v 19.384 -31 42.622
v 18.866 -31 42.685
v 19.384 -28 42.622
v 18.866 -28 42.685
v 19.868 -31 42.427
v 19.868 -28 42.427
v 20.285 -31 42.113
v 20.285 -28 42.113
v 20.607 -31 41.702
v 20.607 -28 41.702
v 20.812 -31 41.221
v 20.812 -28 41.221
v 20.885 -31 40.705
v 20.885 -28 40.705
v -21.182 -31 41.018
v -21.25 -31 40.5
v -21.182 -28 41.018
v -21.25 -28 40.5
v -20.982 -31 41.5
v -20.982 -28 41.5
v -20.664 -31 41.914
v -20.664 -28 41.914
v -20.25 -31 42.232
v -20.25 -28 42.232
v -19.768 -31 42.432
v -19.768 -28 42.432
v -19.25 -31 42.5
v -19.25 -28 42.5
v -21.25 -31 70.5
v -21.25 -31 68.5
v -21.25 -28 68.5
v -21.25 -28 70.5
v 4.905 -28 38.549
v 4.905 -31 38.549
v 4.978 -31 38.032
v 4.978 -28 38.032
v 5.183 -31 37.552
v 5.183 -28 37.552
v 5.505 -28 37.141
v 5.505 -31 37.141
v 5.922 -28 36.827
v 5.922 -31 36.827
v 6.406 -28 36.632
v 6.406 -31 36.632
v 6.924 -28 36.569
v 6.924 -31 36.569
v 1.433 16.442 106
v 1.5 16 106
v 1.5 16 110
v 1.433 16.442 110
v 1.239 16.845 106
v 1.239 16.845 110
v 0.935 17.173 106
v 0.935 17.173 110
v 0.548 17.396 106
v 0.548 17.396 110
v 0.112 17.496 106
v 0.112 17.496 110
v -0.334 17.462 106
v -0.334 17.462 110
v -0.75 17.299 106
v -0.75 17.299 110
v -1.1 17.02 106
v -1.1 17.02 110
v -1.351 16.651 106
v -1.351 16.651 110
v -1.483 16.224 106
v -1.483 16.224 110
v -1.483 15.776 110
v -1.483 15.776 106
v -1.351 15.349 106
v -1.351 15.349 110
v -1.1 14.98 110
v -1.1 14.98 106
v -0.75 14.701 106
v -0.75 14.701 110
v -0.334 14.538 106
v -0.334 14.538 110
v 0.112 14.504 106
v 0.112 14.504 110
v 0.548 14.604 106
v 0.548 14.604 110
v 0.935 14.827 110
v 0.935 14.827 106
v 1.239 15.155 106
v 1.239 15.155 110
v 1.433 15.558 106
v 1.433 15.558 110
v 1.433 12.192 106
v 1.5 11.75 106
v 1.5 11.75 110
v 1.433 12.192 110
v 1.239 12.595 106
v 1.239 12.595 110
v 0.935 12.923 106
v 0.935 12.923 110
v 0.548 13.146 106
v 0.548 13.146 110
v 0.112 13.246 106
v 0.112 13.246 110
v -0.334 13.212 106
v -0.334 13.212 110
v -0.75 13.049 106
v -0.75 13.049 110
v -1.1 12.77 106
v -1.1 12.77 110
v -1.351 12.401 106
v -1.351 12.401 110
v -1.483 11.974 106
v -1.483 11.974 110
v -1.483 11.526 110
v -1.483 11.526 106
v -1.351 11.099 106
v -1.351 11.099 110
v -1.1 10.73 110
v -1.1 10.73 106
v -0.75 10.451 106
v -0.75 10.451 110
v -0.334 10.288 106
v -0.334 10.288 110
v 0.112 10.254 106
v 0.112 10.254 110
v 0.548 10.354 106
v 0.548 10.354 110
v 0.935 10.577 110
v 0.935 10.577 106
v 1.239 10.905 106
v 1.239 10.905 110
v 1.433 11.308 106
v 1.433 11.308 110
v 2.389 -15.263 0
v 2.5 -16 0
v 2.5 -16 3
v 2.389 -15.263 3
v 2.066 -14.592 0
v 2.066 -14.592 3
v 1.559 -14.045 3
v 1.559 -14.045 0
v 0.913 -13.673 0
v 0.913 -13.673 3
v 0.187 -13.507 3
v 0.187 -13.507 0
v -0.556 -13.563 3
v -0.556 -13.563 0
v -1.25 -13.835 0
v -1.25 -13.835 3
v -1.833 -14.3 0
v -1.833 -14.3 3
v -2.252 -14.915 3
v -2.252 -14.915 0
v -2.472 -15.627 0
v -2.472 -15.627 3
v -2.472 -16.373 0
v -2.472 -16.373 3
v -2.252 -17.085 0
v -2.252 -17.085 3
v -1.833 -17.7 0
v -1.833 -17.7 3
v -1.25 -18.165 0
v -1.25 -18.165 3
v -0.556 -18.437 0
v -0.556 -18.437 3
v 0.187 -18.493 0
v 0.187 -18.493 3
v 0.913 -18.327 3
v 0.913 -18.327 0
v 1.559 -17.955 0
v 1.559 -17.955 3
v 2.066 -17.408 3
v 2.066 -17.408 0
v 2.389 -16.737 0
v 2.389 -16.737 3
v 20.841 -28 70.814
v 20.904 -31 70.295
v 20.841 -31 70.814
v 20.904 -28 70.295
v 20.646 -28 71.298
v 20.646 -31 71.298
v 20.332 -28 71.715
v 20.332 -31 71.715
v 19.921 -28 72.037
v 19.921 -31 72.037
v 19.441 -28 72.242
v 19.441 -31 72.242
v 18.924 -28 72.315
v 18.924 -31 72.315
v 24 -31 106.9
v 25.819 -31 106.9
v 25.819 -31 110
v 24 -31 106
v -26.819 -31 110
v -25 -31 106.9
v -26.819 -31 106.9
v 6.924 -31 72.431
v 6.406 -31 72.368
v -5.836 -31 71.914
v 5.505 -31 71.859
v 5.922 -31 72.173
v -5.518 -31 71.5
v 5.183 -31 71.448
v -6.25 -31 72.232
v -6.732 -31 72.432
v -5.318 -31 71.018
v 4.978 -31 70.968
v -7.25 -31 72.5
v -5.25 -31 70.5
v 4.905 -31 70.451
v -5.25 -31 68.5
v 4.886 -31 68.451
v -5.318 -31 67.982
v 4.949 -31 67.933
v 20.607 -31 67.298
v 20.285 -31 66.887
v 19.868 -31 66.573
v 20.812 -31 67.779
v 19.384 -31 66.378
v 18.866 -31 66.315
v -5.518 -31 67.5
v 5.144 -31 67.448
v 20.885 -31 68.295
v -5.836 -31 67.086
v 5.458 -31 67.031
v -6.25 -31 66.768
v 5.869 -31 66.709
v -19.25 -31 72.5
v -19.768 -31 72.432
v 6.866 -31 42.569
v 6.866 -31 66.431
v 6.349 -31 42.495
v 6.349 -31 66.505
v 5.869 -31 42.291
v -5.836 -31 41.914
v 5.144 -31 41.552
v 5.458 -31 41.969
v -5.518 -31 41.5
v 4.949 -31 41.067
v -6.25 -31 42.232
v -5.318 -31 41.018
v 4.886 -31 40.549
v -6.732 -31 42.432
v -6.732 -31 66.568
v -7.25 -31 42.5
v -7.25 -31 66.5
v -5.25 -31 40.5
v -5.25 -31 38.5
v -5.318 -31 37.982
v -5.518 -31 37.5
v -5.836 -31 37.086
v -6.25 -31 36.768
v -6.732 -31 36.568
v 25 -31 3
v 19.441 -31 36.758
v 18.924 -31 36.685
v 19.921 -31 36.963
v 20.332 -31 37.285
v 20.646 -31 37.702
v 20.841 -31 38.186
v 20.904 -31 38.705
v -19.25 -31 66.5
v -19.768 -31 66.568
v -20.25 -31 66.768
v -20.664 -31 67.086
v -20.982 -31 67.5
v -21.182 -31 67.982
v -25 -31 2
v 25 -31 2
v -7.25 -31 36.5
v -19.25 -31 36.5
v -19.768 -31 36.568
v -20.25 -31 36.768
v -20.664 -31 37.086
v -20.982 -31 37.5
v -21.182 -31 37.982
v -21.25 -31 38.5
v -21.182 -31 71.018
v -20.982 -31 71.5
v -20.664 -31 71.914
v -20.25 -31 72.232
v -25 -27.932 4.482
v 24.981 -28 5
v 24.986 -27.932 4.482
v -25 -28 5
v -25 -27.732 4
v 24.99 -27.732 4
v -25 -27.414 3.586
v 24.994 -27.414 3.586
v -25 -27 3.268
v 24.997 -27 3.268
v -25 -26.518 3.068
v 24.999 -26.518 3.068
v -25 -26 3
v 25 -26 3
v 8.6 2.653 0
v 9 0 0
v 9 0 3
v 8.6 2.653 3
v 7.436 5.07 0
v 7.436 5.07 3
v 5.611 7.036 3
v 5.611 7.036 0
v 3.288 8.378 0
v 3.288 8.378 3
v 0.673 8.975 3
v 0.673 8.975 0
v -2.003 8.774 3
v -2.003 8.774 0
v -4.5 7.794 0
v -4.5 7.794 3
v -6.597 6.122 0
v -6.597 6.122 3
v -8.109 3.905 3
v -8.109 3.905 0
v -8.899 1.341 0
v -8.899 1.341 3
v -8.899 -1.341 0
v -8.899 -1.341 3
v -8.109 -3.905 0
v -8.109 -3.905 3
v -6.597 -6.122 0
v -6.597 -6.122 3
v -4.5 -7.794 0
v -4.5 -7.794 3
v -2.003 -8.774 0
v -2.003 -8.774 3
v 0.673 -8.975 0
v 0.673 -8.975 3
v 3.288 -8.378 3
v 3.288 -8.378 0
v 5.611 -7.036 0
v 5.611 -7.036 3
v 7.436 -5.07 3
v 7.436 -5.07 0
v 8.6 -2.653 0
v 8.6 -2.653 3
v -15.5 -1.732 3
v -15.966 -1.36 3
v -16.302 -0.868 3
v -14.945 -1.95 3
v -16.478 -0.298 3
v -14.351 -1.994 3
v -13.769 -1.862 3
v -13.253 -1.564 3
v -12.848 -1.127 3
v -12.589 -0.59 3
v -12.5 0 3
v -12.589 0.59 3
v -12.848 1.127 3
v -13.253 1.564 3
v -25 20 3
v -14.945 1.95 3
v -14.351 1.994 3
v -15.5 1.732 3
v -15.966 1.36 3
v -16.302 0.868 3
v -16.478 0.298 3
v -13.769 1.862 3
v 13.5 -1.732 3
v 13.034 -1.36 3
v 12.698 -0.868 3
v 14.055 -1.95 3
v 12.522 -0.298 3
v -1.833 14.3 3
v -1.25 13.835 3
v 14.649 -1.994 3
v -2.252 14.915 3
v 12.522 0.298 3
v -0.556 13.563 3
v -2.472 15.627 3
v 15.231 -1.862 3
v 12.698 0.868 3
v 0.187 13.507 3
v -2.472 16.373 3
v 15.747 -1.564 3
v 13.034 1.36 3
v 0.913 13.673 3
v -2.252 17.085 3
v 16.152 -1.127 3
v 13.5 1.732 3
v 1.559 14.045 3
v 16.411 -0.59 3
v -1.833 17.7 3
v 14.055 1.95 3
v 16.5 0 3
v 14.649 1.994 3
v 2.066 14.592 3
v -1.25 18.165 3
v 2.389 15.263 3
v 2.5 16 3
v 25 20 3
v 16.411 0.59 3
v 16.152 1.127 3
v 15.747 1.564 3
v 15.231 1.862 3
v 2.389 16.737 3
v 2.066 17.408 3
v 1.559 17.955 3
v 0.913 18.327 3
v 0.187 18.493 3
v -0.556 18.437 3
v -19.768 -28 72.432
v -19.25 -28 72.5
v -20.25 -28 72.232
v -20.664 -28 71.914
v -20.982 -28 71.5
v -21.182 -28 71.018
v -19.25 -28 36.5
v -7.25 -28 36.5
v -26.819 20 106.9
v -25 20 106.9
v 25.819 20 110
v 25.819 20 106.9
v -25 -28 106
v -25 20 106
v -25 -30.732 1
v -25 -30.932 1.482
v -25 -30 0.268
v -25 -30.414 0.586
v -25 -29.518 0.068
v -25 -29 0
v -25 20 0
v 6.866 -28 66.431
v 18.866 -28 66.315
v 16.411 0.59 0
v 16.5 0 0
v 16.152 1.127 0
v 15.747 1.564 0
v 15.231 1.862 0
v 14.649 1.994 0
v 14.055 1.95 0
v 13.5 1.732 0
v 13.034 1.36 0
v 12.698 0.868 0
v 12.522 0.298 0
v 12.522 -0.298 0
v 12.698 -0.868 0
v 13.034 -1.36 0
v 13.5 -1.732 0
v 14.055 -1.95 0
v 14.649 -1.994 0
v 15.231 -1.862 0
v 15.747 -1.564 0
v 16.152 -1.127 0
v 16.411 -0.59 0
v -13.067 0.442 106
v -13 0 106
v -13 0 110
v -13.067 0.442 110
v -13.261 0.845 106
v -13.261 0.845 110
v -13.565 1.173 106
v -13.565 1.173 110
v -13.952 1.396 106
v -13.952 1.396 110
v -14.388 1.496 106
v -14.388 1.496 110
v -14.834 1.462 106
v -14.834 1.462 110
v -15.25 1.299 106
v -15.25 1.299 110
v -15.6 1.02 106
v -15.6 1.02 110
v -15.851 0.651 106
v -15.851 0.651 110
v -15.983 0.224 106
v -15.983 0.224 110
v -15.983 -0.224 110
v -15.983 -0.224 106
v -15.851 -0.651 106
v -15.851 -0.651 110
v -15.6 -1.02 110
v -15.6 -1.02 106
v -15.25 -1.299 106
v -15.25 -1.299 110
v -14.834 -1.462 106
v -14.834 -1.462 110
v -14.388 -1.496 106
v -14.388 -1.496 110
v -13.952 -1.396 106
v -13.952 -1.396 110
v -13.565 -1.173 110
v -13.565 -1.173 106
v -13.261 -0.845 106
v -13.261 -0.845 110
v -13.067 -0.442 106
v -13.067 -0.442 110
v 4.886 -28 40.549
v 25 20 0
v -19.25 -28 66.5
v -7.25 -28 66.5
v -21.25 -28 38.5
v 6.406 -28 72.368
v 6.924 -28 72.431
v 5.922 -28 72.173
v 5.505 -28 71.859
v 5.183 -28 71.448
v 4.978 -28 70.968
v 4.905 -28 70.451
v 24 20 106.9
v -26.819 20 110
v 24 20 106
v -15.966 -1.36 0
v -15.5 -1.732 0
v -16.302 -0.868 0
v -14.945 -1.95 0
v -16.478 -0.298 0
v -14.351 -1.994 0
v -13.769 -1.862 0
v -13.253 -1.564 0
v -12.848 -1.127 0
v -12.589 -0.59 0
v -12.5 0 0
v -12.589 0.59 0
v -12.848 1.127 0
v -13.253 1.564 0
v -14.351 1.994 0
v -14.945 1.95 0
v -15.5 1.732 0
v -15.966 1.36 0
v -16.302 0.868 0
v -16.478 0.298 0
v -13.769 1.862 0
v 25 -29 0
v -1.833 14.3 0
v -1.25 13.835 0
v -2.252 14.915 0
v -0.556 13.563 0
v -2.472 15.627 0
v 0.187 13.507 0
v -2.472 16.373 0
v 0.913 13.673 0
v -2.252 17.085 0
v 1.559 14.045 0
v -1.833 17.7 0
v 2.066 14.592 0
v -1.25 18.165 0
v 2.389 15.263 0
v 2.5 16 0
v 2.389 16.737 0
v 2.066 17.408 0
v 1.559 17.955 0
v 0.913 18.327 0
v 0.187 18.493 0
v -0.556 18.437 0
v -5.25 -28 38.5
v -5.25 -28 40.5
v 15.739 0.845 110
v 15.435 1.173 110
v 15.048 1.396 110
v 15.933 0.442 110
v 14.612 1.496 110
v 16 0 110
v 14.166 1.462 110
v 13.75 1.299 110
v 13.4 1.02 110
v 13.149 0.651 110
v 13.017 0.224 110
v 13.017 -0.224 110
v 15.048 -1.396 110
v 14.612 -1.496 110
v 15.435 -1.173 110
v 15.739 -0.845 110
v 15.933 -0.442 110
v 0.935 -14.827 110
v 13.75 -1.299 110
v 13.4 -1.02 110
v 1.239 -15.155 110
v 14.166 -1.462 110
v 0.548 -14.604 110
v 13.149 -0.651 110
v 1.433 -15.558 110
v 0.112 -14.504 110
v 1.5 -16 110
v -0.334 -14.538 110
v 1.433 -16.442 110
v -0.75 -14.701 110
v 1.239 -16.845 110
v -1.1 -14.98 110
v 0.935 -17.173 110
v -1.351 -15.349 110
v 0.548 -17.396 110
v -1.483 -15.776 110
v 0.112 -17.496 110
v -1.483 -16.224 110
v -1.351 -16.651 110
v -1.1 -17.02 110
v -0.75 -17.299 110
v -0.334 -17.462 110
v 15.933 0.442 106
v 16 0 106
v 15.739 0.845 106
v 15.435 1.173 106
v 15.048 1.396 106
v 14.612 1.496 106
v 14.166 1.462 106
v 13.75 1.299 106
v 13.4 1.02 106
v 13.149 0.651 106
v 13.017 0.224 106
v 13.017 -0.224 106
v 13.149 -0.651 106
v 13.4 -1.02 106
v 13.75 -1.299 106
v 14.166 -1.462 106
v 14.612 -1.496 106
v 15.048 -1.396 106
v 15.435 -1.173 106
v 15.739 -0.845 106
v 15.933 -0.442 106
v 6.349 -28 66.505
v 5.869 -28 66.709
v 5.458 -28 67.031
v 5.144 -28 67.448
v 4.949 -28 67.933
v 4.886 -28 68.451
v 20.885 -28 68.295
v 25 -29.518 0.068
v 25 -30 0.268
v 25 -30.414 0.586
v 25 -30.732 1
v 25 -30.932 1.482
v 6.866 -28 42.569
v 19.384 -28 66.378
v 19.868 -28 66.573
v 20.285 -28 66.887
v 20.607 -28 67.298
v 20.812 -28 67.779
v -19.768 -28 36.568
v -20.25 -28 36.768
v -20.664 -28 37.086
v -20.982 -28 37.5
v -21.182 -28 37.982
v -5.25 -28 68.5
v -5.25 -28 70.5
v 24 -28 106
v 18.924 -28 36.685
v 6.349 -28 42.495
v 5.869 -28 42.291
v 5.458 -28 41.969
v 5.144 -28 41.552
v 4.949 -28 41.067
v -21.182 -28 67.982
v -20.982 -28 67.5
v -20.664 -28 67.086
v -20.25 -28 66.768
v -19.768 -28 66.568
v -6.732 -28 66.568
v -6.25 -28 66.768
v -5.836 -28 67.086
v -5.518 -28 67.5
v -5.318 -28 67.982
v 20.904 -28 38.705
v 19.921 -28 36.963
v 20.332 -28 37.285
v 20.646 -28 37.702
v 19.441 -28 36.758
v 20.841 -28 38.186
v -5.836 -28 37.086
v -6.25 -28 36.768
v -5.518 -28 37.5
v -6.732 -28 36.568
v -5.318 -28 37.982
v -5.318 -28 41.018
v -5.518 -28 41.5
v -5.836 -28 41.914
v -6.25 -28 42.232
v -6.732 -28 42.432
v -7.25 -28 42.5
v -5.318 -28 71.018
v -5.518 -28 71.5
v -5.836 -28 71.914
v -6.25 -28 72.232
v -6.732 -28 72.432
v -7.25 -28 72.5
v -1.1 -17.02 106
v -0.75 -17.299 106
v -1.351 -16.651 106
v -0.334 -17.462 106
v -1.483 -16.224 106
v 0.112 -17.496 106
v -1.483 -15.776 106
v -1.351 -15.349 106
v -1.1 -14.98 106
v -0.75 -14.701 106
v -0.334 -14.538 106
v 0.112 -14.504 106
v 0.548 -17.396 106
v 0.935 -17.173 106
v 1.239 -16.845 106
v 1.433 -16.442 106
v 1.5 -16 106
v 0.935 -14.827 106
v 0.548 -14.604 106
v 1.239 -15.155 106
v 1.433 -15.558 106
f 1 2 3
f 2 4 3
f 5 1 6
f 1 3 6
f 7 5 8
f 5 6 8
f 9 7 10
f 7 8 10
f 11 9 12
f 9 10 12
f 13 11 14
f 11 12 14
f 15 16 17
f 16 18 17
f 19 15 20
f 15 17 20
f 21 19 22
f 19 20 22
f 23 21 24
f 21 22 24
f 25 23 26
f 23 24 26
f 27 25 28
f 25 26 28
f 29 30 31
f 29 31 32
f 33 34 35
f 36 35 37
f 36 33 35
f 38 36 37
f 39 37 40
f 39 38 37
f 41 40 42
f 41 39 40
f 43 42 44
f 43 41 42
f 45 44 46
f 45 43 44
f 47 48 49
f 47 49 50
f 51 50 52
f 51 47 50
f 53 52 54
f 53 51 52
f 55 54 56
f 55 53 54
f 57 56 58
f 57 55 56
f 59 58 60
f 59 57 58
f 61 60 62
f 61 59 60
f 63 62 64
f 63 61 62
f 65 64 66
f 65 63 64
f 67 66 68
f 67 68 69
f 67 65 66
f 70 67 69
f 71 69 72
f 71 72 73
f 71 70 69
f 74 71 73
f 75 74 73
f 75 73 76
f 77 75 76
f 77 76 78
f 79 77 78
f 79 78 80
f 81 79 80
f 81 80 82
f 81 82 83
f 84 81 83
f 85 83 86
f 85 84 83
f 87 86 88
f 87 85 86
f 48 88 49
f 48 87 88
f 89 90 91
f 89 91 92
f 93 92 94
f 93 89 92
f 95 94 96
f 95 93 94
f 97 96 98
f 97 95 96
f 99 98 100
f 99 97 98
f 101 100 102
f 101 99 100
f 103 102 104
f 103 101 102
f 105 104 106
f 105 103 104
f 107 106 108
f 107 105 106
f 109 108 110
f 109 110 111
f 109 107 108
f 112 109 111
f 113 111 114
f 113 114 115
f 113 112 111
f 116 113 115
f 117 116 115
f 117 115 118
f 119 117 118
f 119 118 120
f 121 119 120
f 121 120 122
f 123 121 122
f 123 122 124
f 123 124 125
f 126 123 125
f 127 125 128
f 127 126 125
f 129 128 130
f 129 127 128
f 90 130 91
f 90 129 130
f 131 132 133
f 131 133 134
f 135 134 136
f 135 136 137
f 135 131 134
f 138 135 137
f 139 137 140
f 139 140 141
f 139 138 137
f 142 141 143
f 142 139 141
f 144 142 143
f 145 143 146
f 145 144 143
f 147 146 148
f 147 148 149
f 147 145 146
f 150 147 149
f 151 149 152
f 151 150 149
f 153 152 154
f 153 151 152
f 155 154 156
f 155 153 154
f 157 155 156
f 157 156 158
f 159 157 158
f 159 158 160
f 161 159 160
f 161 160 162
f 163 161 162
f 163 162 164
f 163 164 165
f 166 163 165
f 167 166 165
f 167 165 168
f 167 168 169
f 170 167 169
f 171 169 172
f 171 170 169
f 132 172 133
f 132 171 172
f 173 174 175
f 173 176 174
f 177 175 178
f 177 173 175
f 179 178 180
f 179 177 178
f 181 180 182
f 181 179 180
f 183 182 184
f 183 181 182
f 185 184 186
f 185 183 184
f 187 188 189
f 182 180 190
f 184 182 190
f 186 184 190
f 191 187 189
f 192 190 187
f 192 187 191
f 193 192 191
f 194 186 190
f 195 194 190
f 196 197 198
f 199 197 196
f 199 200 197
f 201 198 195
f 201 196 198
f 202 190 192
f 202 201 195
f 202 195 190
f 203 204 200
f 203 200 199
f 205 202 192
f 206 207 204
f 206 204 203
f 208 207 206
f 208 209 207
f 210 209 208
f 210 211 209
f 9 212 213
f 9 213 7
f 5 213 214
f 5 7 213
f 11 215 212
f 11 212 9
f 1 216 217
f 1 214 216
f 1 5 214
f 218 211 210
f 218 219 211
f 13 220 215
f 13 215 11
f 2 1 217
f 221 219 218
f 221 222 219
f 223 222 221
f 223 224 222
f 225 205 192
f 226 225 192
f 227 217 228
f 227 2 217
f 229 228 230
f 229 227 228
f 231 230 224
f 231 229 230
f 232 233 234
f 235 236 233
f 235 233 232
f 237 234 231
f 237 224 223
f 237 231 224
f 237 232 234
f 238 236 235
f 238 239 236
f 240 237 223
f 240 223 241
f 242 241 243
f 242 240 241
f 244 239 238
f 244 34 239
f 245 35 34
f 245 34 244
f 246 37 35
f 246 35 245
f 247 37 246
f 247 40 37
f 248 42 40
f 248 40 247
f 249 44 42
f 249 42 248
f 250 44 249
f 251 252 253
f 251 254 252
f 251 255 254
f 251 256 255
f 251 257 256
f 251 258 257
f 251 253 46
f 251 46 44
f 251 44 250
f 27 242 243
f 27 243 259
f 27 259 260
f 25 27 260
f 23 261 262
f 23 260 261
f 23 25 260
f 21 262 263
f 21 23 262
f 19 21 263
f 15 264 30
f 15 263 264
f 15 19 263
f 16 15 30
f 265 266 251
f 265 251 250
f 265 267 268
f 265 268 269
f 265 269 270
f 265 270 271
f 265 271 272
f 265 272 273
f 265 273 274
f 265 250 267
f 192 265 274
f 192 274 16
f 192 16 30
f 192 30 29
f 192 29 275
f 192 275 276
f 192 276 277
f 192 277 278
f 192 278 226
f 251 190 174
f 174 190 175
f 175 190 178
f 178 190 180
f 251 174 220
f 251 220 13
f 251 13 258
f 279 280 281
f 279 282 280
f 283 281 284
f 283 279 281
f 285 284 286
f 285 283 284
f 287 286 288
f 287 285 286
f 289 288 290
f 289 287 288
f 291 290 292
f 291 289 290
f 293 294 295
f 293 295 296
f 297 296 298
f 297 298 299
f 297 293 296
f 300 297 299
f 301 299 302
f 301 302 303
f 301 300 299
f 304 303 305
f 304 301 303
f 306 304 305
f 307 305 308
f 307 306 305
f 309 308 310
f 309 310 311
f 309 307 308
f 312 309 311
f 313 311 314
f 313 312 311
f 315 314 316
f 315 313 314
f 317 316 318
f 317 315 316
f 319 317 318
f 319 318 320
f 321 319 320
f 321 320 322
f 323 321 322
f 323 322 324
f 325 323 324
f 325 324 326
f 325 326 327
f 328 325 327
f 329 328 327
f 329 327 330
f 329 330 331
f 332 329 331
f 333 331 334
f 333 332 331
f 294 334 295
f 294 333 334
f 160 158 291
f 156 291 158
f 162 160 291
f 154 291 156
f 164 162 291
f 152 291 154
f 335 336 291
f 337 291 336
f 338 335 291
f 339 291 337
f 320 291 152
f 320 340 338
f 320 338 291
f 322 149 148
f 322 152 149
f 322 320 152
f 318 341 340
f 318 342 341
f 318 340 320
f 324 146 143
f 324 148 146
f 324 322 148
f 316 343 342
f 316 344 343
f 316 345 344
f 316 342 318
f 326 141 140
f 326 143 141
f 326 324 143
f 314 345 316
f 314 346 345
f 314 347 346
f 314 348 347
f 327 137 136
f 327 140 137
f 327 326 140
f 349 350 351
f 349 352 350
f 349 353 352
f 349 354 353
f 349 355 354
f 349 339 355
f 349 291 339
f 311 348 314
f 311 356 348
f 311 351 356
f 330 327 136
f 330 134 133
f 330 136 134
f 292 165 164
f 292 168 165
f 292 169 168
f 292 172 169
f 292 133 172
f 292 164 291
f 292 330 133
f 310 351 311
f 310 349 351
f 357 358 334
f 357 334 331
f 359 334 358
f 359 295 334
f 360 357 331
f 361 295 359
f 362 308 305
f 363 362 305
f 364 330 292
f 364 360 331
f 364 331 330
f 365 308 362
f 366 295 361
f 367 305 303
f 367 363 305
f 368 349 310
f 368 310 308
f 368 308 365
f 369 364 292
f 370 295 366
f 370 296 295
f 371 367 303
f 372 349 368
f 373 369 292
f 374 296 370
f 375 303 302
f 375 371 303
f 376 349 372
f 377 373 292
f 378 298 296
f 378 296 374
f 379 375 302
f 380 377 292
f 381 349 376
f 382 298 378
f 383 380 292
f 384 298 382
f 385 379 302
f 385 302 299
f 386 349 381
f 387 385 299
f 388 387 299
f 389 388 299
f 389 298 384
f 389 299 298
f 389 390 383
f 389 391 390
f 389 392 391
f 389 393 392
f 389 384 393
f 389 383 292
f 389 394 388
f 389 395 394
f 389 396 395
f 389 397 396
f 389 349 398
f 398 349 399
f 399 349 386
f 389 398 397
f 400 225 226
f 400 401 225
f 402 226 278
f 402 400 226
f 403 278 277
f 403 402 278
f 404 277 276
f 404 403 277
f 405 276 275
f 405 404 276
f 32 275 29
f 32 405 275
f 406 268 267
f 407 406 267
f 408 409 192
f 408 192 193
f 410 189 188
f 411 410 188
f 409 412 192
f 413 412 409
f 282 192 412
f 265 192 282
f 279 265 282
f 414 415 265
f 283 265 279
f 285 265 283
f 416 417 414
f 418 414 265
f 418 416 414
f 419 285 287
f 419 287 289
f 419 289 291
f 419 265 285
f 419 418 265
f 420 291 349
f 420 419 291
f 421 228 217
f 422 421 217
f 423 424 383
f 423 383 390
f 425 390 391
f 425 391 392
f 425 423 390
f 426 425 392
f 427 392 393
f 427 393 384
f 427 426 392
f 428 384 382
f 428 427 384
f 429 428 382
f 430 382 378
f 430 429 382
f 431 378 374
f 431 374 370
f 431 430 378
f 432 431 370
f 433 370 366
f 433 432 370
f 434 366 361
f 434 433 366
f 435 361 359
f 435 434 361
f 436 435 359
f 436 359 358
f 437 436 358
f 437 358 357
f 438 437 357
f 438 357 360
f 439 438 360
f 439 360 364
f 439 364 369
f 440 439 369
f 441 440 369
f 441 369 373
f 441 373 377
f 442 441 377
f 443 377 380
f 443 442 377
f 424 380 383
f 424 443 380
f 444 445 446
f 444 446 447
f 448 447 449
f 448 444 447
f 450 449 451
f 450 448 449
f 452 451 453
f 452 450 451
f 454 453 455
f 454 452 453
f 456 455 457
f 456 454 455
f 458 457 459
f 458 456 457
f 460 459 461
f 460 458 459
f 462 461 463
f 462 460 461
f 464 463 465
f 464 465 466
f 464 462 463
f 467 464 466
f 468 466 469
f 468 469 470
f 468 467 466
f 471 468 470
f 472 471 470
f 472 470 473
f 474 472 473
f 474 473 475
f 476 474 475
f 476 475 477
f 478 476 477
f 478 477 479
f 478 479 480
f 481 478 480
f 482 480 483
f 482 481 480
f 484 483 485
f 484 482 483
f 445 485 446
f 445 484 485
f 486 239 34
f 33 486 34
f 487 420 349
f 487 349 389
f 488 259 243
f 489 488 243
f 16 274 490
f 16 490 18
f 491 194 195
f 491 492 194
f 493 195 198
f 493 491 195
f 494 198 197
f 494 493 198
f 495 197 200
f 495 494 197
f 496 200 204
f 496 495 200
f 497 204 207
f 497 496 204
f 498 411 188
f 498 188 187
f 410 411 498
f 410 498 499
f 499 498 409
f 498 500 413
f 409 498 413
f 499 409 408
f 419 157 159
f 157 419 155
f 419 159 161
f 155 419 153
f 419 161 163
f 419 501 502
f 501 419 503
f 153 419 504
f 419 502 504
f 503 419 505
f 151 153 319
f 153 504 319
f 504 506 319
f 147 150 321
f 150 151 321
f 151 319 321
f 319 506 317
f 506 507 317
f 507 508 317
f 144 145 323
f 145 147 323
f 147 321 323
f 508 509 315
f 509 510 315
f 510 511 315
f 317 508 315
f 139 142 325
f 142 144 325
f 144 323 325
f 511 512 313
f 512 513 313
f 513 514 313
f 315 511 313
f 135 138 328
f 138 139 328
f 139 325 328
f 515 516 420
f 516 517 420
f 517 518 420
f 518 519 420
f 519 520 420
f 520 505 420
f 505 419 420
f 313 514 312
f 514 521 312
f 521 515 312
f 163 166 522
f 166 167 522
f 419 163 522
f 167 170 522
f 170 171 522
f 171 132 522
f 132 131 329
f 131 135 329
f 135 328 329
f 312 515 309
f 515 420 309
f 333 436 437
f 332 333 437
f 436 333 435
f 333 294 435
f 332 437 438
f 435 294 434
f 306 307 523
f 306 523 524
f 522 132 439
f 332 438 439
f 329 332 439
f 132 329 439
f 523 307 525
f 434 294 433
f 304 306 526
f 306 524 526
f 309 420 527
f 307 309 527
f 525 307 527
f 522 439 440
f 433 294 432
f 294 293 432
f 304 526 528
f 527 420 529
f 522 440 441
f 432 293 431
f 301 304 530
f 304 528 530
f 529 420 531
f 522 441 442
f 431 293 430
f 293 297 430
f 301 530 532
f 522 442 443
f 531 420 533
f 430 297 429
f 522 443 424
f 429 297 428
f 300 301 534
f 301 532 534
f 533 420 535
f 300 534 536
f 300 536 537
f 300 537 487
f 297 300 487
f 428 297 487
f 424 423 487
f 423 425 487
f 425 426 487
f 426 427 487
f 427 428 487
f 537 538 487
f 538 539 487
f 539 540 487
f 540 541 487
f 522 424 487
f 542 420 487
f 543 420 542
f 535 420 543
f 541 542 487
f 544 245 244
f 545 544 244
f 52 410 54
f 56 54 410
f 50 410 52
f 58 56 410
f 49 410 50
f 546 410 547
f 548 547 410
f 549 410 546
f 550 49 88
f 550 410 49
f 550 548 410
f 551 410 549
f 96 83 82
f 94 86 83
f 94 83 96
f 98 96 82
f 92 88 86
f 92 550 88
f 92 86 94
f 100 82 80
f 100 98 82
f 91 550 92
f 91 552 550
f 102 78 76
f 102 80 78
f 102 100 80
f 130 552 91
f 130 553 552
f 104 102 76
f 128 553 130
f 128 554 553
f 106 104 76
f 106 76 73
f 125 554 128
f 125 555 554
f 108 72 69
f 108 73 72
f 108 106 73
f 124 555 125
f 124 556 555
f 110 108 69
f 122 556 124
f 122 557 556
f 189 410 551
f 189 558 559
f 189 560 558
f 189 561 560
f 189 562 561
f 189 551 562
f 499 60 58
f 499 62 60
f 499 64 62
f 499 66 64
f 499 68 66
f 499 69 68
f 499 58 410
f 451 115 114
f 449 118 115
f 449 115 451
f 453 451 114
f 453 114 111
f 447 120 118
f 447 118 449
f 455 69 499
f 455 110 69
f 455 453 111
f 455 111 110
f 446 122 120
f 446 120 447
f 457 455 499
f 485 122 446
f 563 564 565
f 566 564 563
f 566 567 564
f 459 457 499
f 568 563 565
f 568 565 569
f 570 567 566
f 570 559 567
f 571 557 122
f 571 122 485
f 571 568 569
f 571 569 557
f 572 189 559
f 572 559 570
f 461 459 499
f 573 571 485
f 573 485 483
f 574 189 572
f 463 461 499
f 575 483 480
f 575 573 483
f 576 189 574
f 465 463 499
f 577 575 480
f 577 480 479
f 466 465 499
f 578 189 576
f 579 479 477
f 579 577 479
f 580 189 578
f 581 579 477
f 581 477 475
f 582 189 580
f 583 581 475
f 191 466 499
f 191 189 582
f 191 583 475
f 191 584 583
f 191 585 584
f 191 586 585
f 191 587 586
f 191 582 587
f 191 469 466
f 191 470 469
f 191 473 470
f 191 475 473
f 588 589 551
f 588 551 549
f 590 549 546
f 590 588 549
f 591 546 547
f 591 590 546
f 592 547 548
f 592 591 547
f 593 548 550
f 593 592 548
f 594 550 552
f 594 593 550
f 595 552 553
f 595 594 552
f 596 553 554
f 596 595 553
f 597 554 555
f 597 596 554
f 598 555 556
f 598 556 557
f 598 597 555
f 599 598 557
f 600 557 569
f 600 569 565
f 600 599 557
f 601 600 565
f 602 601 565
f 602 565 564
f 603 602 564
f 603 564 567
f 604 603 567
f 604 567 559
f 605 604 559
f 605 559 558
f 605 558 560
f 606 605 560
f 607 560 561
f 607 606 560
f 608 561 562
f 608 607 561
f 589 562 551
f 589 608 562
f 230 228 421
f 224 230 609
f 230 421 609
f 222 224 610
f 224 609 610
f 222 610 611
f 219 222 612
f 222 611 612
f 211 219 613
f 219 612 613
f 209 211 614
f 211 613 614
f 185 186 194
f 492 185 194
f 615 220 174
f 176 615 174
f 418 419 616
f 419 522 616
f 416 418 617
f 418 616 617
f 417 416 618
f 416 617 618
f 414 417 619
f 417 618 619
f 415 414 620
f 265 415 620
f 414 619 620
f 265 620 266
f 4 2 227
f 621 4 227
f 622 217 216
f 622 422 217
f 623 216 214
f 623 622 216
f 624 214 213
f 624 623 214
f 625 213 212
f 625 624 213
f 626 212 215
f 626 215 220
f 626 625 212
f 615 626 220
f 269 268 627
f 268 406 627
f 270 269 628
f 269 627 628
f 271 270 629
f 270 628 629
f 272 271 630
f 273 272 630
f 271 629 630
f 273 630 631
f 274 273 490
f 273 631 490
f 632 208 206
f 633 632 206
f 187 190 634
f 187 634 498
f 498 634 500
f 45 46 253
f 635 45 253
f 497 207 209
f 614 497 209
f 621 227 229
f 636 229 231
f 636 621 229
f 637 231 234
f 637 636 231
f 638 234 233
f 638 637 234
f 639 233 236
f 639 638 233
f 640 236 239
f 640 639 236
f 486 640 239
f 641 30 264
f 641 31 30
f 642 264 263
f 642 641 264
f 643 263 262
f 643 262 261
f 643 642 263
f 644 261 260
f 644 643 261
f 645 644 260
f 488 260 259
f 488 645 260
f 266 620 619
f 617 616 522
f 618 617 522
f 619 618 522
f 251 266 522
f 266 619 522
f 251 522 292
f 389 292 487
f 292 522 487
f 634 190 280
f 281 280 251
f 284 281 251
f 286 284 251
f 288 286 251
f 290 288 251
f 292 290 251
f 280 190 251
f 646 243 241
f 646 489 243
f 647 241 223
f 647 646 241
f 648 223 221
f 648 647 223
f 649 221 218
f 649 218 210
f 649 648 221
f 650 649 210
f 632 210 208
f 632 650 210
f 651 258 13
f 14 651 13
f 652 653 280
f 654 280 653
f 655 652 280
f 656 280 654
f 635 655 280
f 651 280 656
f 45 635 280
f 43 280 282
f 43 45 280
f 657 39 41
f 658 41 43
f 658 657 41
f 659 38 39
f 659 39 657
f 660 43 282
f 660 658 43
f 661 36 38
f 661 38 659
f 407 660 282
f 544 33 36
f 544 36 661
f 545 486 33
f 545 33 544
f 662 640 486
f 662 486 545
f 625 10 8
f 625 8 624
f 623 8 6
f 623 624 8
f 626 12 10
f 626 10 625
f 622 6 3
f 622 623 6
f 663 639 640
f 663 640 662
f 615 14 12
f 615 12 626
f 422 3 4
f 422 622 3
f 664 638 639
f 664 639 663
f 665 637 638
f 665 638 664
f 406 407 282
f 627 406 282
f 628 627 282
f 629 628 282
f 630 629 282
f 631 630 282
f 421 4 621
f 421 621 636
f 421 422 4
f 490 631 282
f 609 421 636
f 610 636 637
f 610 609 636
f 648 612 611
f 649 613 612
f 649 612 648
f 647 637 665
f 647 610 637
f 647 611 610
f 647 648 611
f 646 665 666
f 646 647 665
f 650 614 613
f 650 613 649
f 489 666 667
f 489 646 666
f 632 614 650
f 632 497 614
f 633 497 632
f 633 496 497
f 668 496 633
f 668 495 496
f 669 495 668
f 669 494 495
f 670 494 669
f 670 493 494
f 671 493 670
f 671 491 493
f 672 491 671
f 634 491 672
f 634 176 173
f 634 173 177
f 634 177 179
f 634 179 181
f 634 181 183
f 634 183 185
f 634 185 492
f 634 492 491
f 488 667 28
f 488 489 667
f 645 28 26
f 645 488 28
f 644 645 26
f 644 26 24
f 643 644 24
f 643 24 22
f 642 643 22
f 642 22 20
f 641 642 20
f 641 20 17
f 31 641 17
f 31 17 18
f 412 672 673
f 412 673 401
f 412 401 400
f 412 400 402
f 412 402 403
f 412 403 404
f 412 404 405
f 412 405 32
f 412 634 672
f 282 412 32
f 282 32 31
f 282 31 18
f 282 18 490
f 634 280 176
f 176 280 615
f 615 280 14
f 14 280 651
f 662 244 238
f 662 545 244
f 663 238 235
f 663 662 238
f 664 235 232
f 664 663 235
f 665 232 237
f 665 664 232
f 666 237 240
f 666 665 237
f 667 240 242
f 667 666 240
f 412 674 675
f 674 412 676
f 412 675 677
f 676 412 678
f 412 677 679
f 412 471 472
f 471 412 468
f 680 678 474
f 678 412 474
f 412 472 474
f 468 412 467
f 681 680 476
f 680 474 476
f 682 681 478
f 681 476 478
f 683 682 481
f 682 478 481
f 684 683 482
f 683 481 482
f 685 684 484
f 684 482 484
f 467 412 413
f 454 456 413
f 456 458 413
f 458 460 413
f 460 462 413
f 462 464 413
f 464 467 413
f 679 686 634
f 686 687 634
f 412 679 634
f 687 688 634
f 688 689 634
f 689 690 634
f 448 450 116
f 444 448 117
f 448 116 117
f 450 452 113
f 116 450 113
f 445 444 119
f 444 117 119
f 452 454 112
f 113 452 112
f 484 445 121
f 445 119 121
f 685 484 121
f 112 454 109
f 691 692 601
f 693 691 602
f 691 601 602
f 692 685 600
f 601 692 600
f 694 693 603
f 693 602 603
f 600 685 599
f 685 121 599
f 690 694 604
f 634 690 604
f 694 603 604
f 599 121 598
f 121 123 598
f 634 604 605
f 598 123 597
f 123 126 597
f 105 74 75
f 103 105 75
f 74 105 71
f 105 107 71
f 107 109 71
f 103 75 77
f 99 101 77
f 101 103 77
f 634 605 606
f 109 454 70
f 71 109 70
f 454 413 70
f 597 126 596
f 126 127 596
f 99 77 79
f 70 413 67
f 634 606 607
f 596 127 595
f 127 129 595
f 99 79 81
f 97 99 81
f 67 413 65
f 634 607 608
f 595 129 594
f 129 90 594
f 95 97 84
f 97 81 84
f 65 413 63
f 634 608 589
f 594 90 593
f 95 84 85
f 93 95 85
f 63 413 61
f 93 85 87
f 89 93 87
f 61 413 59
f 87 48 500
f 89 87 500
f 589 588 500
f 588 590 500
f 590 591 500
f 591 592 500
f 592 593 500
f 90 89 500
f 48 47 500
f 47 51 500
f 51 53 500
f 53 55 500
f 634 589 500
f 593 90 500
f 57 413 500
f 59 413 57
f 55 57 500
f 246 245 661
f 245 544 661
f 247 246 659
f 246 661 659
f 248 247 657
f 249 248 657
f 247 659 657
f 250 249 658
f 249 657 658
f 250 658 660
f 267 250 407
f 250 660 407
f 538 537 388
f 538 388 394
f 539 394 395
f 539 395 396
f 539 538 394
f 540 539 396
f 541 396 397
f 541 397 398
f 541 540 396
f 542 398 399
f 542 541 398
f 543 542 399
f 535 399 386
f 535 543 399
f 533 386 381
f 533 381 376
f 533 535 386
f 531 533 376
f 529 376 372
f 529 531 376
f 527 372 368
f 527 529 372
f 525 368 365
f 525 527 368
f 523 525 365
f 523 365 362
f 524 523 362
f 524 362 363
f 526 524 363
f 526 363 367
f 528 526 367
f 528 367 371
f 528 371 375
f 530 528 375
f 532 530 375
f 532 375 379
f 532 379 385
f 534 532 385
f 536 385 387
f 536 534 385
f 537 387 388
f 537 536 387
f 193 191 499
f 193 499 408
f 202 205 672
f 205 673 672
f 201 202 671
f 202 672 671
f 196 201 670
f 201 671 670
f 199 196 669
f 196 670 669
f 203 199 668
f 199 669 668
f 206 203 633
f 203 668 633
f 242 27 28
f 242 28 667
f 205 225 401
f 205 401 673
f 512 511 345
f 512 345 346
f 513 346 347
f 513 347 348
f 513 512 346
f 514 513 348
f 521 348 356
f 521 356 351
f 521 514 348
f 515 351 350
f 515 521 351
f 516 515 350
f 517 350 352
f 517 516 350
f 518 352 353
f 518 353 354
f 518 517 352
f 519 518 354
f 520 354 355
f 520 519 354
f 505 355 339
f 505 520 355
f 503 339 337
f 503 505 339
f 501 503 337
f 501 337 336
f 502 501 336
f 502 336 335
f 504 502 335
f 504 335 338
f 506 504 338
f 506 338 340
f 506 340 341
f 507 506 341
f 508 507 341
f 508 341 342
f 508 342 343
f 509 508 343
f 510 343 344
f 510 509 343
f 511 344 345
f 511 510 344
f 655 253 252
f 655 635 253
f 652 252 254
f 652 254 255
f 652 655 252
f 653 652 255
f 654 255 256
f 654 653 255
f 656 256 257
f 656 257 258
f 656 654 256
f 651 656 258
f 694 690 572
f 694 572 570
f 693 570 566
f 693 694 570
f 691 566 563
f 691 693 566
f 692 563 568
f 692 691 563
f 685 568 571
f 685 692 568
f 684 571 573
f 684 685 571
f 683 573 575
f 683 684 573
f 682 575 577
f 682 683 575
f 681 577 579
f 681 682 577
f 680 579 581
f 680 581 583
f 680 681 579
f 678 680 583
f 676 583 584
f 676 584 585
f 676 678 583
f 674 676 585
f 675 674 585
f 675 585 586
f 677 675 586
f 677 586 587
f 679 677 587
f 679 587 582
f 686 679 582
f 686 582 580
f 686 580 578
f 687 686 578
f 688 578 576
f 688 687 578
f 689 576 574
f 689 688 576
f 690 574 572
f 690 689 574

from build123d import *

# Parameters (mm, degrees)
SKETCH_1_W      = 50
SKETCH_1_H      = 51
SKETCH_1_R      = 9
SKETCH_1_R_2    = 2
SKETCH_1_R_3    = 2.5
EXTRUDE_1_DEPTH = 3
SKETCH_2_W      = 16
SKETCH_2_H      = 6
EXTRUDE_2_DEPTH = 3
SKETCH_3_W      = 49
SKETCH_3_H      = 51
SKETCH_3_R      = 1.5
EXTRUDE_3_DEPTH = 4
FILLET_2_R      = 2
FILLET_3_R      = 2
FILLET_4_R      = 2
FILLET_5_R      = 2
FILLET_6_R      = 2
SKETCH_4_W      = 1.818653348
SKETCH_4_H      = 3.1
EXTRUDE_4_DEPTH = 51


with BuildPart() as part:
    # 草图1 → 凸台-拉伸1 (new body)
    with BuildSketch(Plane.XY):
        with Locations((0, -5.5)):
            Rectangle(SKETCH_1_W, SKETCH_1_H)
        Circle(SKETCH_1_R, mode=Mode.SUBTRACT)
        with Locations((14.5, 0)):
            Circle(SKETCH_1_R_2, mode=Mode.SUBTRACT)
        with Locations((-14.5, 0)):
            Circle(SKETCH_1_R_2, mode=Mode.SUBTRACT)
        with Locations((0, 16)):
            Circle(SKETCH_1_R_3, mode=Mode.SUBTRACT)
        with Locations((0, -16)):
            Circle(SKETCH_1_R_3, mode=Mode.SUBTRACT)
    extrude(amount=EXTRUDE_1_DEPTH)

    # 草图2 → 凸台-拉伸2 (add)
    with BuildSketch(Plane.XZ.offset(31)):
        Polygon((-25, 3), (-25, 106), (24, 106), (25, 3), align=None)
        with Locations((-13.25, 39.5)):
            Rectangle(SKETCH_2_W, SKETCH_2_H, mode=Mode.SUBTRACT)
        Polygon((4.866266466, 42.54910809), (4.92451752, 36.549390862), (20.923763461, 36.704727007), (20.865512407, 42.704444235), align=None, mode=Mode.SUBTRACT)
        with Locations((-13.25, 69.5)):
            Rectangle(SKETCH_2_W, SKETCH_2_H, mode=Mode.SUBTRACT)
        Polygon((20.865512407, 66.295555765), (20.923763461, 72.295272993), (4.92451752, 72.450609138), (4.866266466, 66.45089191), align=None, mode=Mode.SUBTRACT)
    extrude(amount=-EXTRUDE_2_DEPTH)

    # 草图3 → 凸台-拉伸3 (add)
    with BuildSketch(Plane.XY.offset(106)):
        with Locations((-0.5, -5.5)):
            Rectangle(SKETCH_3_W, SKETCH_3_H)
        with Locations((-14.5, 0)):
            Circle(SKETCH_3_R, mode=Mode.SUBTRACT)
        with Locations((14.5, 0)):
            Circle(SKETCH_3_R, mode=Mode.SUBTRACT)
        with Locations((0, -16)):
            Circle(SKETCH_3_R, mode=Mode.SUBTRACT)
        with Locations((0, 16)):
            Circle(SKETCH_3_R, mode=Mode.SUBTRACT)
        with Locations((0, 11.75)):
            Circle(SKETCH_3_R, mode=Mode.SUBTRACT)
    extrude(amount=EXTRUDE_3_DEPTH)

    # 圆角2
    fillet_2_edges = [part.edges().sort_by_distance(p)[0] for p in [
        (-5.25, -29.5, 36.5),
    ]]
    fillet(fillet_2_edges, radius=FILLET_2_R)

    # 圆角3
    fillet_3_edges = [part.edges().sort_by_distance(p)[0] for p in [
        (-21.25, -29.5, 36.5),
        (-21.25, -29.5, 42.5),
        (-5.25, -29.5, 42.5),
    ]]
    fillet(fillet_3_edges, radius=FILLET_3_R)

    # 圆角4
    fillet_4_edges = [part.edges().sort_by_distance(p)[0] for p in [
        (20.865512407, -29.5, 42.704444235),
        (20.923763461, -29.5, 36.704727007),
        (4.92451752, -29.5, 36.549390862),
        (4.866266466, -29.5, 42.54910809),
        (-21.25, -29.5, 66.5),
        (-21.25, -29.5, 72.5),
        (-5.25, -29.5, 72.5),
        (-5.25, -29.5, 66.5),
        (4.866266466, -29.5, 66.45089191),
        (4.92451752, -29.5, 72.450609138),
        (20.923763461, -29.5, 72.295272993),
        (20.865512407, -29.5, 66.295555765),
    ]]
    fillet(fillet_4_edges, radius=FILLET_4_R)

    # 圆角5
    fillet_5_edges = [part.edges().sort_by_distance(p)[0] for p in [
        (0, -28, 3),
    ]]
    fillet(fillet_5_edges, radius=FILLET_5_R)

    # 圆角6
    fillet_6_edges = [part.edges().sort_by_distance(p)[0] for p in [
        (0, -31, 0),
    ]]
    fillet(fillet_6_edges, radius=FILLET_6_R)

    # 草图4 → 凸台-拉伸4 (add)
    with BuildSketch(Plane(origin=(0, -31, 0), x_dir=(-1, 0, 0), z_dir=(0, -1, 0))):
        with Locations((-24.909326674, -108.45)):
            Rectangle(SKETCH_4_W, SKETCH_4_H)
        with Locations((25.909326674, -108.45)):
            Rectangle(SKETCH_4_W, SKETCH_4_H)
    extrude(amount=-EXTRUDE_4_DEPTH)


solid = part.part
